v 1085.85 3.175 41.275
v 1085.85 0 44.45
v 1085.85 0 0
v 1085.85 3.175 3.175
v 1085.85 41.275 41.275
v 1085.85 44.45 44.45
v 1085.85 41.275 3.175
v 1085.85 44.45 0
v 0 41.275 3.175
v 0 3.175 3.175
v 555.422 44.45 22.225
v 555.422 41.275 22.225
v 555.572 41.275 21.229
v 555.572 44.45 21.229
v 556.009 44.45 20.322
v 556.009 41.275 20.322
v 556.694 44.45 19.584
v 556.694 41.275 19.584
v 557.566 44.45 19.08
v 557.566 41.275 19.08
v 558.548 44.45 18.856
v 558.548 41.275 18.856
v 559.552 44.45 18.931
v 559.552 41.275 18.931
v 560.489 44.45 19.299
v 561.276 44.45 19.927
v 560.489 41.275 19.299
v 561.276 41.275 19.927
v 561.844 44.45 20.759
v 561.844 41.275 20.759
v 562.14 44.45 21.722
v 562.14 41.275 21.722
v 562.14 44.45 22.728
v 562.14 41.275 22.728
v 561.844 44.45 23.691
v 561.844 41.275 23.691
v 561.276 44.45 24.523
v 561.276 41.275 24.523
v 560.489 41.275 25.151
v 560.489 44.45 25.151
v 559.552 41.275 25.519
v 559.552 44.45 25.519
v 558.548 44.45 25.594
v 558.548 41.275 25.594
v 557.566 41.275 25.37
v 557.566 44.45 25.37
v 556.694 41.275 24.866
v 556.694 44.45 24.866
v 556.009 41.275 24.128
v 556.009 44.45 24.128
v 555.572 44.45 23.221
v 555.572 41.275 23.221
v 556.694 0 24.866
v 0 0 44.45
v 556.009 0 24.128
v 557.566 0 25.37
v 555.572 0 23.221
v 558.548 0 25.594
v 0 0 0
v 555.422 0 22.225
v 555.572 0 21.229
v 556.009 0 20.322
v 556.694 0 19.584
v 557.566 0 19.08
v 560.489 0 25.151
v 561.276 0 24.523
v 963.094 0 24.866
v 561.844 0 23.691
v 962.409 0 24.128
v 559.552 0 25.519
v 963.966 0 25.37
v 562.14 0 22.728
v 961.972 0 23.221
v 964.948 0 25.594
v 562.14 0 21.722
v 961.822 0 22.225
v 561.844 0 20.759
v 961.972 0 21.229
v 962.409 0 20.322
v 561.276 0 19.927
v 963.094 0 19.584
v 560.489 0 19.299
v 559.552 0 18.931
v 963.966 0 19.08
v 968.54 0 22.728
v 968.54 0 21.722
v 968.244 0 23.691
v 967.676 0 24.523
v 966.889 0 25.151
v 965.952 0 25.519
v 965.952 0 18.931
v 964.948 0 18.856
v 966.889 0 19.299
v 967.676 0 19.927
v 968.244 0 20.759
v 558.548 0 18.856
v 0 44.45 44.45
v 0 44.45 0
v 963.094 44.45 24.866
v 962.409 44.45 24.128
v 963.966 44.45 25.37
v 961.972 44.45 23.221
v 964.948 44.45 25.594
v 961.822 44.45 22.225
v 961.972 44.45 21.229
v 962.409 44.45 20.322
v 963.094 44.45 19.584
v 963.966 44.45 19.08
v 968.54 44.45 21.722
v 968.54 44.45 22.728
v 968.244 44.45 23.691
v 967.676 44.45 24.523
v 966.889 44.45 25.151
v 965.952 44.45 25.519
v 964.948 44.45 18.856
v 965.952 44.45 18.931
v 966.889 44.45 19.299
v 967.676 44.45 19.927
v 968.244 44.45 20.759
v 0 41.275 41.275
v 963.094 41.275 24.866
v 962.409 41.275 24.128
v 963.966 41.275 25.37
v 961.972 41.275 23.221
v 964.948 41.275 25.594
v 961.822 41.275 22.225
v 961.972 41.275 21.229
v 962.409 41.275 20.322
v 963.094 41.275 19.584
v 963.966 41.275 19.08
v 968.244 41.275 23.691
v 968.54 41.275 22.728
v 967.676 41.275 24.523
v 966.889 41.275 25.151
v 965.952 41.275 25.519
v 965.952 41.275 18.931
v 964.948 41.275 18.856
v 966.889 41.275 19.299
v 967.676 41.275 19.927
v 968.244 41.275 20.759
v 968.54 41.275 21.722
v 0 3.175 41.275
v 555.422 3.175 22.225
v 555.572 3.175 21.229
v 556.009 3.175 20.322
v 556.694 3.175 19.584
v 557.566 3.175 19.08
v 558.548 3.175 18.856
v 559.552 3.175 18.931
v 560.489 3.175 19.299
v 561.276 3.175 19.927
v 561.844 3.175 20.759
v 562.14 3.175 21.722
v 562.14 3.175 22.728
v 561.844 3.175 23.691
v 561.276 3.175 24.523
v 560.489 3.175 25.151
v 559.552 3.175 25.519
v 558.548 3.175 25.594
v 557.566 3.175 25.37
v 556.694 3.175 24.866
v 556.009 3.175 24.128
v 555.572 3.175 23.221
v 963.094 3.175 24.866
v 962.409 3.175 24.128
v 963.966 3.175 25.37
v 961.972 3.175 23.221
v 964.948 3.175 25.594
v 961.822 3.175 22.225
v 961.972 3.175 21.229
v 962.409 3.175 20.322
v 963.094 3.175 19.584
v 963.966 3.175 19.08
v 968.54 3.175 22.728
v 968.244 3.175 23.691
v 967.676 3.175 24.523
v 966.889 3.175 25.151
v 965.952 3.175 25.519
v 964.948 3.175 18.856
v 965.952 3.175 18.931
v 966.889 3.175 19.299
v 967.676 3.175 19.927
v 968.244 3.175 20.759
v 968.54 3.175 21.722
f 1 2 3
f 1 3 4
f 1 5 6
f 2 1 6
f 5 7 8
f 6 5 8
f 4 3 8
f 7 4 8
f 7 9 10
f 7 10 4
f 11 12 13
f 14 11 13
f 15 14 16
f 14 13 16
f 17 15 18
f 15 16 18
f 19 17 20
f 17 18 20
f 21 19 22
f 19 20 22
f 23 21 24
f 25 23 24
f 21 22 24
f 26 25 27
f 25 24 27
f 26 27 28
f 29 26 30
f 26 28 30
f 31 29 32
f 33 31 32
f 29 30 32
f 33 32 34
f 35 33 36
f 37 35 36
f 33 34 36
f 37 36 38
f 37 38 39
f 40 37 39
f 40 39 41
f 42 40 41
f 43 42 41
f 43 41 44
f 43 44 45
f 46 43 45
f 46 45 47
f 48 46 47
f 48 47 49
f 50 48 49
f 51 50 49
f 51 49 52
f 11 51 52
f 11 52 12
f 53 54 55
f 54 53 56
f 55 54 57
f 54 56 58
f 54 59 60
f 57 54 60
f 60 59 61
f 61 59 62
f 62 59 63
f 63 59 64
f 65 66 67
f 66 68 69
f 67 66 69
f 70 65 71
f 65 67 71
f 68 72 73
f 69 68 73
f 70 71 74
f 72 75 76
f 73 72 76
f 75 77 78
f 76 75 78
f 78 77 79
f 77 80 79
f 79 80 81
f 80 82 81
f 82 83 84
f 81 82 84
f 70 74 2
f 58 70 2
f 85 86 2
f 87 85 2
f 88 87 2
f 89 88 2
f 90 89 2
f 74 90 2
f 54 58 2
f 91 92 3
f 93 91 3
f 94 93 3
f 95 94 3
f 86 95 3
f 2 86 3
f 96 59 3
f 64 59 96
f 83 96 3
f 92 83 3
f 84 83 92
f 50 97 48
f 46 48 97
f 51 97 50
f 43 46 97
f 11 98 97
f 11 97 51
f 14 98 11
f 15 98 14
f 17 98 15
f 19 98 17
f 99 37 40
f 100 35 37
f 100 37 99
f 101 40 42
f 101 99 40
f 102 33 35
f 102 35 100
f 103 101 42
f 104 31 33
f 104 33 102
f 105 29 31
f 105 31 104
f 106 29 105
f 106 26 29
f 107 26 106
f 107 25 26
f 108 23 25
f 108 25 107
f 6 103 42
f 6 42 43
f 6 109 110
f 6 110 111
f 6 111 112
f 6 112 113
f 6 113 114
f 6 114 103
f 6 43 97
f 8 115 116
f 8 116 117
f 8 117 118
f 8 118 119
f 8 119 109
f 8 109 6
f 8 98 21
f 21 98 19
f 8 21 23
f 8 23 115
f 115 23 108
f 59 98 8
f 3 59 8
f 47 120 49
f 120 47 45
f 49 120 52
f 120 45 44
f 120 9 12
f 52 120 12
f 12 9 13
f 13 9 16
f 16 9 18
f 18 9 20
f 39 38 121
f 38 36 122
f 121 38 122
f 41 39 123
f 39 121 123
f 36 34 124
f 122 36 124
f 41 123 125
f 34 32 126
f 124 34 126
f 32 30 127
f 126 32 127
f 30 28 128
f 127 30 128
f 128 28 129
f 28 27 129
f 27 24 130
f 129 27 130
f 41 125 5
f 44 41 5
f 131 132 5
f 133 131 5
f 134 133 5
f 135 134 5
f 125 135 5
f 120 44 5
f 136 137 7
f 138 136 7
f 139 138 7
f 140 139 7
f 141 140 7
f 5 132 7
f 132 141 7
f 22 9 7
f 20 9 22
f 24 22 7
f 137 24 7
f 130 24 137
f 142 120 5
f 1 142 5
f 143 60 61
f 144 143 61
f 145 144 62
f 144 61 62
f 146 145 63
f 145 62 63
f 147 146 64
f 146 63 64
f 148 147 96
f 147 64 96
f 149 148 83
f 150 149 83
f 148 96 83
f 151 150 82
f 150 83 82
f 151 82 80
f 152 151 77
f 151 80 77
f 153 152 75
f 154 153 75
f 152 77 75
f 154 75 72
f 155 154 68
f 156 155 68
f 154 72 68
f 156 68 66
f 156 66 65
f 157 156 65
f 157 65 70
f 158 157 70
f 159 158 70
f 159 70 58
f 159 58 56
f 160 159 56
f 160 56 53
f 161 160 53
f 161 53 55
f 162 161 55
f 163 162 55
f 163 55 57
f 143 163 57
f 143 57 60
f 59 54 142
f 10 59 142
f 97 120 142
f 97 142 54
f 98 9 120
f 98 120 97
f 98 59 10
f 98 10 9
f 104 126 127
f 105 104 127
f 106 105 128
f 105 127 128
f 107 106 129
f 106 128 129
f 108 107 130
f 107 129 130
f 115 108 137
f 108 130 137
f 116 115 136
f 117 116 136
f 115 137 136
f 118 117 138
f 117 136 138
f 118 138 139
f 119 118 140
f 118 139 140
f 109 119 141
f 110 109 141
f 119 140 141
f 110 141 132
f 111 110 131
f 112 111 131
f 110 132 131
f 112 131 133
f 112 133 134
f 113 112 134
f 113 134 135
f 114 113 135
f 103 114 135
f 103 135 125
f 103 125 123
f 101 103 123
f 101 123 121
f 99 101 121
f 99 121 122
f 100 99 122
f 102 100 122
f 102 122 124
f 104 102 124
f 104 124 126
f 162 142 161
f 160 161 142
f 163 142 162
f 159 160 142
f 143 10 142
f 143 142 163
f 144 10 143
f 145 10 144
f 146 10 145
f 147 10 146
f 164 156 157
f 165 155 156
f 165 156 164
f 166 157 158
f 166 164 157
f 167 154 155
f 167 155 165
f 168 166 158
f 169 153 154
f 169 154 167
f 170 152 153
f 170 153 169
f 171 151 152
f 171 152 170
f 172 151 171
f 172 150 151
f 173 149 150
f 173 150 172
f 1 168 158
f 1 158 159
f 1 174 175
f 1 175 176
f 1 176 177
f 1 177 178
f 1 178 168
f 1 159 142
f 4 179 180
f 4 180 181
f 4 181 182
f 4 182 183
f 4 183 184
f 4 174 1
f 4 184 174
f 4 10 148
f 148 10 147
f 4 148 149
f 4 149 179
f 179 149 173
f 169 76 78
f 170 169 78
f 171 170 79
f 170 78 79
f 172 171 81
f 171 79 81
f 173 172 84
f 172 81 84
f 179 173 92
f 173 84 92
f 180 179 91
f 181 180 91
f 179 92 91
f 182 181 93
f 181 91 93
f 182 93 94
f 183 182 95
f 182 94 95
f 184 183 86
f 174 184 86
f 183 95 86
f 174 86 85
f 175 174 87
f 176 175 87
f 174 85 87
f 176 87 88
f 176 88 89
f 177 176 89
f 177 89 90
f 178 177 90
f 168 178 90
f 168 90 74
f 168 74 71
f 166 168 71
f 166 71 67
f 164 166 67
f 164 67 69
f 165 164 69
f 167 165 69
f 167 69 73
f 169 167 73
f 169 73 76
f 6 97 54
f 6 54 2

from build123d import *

# Parameters (mm, degrees)
SKETCH1_W                = 1085.85
SKETCH1_H                = 44.45
BOSS_EXTRUDE1_DEPTH      = 44.45
SHELL1_T                 = -3.175
H_0_266_DIAMETER_HOLE1_D = 6.7564


with BuildPart() as part:
    # Sketch1 → Boss-Extrude1 (new body)
    with BuildSketch(Plane.XY):
        with Locations((542.925, 22.225)):
            Rectangle(SKETCH1_W, SKETCH1_H)
    extrude(amount=BOSS_EXTRUDE1_DEPTH)

    # Shell1
    shell1_openings = [part.faces().sort_by_distance(p)[0] for p in [
        (1085.85, 22.225, 22.225),
        (0, 22.225, 22.225),
    ]]
    offset(amount=SHELL1_T, openings=shell1_openings, kind=Kind.INTERSECTION)

    # H (0.266) Diameter Hole1 (through all)
    with Locations(Plane(origin=(0, 44.45, 0), x_dir=(1, 0, 0), z_dir=(0, 1, 0))):
        with Locations((965.2, -22.225), (558.8, -22.225)):
            Hole(H_0_266_DIAMETER_HOLE1_D / 2)


solid = part.part
